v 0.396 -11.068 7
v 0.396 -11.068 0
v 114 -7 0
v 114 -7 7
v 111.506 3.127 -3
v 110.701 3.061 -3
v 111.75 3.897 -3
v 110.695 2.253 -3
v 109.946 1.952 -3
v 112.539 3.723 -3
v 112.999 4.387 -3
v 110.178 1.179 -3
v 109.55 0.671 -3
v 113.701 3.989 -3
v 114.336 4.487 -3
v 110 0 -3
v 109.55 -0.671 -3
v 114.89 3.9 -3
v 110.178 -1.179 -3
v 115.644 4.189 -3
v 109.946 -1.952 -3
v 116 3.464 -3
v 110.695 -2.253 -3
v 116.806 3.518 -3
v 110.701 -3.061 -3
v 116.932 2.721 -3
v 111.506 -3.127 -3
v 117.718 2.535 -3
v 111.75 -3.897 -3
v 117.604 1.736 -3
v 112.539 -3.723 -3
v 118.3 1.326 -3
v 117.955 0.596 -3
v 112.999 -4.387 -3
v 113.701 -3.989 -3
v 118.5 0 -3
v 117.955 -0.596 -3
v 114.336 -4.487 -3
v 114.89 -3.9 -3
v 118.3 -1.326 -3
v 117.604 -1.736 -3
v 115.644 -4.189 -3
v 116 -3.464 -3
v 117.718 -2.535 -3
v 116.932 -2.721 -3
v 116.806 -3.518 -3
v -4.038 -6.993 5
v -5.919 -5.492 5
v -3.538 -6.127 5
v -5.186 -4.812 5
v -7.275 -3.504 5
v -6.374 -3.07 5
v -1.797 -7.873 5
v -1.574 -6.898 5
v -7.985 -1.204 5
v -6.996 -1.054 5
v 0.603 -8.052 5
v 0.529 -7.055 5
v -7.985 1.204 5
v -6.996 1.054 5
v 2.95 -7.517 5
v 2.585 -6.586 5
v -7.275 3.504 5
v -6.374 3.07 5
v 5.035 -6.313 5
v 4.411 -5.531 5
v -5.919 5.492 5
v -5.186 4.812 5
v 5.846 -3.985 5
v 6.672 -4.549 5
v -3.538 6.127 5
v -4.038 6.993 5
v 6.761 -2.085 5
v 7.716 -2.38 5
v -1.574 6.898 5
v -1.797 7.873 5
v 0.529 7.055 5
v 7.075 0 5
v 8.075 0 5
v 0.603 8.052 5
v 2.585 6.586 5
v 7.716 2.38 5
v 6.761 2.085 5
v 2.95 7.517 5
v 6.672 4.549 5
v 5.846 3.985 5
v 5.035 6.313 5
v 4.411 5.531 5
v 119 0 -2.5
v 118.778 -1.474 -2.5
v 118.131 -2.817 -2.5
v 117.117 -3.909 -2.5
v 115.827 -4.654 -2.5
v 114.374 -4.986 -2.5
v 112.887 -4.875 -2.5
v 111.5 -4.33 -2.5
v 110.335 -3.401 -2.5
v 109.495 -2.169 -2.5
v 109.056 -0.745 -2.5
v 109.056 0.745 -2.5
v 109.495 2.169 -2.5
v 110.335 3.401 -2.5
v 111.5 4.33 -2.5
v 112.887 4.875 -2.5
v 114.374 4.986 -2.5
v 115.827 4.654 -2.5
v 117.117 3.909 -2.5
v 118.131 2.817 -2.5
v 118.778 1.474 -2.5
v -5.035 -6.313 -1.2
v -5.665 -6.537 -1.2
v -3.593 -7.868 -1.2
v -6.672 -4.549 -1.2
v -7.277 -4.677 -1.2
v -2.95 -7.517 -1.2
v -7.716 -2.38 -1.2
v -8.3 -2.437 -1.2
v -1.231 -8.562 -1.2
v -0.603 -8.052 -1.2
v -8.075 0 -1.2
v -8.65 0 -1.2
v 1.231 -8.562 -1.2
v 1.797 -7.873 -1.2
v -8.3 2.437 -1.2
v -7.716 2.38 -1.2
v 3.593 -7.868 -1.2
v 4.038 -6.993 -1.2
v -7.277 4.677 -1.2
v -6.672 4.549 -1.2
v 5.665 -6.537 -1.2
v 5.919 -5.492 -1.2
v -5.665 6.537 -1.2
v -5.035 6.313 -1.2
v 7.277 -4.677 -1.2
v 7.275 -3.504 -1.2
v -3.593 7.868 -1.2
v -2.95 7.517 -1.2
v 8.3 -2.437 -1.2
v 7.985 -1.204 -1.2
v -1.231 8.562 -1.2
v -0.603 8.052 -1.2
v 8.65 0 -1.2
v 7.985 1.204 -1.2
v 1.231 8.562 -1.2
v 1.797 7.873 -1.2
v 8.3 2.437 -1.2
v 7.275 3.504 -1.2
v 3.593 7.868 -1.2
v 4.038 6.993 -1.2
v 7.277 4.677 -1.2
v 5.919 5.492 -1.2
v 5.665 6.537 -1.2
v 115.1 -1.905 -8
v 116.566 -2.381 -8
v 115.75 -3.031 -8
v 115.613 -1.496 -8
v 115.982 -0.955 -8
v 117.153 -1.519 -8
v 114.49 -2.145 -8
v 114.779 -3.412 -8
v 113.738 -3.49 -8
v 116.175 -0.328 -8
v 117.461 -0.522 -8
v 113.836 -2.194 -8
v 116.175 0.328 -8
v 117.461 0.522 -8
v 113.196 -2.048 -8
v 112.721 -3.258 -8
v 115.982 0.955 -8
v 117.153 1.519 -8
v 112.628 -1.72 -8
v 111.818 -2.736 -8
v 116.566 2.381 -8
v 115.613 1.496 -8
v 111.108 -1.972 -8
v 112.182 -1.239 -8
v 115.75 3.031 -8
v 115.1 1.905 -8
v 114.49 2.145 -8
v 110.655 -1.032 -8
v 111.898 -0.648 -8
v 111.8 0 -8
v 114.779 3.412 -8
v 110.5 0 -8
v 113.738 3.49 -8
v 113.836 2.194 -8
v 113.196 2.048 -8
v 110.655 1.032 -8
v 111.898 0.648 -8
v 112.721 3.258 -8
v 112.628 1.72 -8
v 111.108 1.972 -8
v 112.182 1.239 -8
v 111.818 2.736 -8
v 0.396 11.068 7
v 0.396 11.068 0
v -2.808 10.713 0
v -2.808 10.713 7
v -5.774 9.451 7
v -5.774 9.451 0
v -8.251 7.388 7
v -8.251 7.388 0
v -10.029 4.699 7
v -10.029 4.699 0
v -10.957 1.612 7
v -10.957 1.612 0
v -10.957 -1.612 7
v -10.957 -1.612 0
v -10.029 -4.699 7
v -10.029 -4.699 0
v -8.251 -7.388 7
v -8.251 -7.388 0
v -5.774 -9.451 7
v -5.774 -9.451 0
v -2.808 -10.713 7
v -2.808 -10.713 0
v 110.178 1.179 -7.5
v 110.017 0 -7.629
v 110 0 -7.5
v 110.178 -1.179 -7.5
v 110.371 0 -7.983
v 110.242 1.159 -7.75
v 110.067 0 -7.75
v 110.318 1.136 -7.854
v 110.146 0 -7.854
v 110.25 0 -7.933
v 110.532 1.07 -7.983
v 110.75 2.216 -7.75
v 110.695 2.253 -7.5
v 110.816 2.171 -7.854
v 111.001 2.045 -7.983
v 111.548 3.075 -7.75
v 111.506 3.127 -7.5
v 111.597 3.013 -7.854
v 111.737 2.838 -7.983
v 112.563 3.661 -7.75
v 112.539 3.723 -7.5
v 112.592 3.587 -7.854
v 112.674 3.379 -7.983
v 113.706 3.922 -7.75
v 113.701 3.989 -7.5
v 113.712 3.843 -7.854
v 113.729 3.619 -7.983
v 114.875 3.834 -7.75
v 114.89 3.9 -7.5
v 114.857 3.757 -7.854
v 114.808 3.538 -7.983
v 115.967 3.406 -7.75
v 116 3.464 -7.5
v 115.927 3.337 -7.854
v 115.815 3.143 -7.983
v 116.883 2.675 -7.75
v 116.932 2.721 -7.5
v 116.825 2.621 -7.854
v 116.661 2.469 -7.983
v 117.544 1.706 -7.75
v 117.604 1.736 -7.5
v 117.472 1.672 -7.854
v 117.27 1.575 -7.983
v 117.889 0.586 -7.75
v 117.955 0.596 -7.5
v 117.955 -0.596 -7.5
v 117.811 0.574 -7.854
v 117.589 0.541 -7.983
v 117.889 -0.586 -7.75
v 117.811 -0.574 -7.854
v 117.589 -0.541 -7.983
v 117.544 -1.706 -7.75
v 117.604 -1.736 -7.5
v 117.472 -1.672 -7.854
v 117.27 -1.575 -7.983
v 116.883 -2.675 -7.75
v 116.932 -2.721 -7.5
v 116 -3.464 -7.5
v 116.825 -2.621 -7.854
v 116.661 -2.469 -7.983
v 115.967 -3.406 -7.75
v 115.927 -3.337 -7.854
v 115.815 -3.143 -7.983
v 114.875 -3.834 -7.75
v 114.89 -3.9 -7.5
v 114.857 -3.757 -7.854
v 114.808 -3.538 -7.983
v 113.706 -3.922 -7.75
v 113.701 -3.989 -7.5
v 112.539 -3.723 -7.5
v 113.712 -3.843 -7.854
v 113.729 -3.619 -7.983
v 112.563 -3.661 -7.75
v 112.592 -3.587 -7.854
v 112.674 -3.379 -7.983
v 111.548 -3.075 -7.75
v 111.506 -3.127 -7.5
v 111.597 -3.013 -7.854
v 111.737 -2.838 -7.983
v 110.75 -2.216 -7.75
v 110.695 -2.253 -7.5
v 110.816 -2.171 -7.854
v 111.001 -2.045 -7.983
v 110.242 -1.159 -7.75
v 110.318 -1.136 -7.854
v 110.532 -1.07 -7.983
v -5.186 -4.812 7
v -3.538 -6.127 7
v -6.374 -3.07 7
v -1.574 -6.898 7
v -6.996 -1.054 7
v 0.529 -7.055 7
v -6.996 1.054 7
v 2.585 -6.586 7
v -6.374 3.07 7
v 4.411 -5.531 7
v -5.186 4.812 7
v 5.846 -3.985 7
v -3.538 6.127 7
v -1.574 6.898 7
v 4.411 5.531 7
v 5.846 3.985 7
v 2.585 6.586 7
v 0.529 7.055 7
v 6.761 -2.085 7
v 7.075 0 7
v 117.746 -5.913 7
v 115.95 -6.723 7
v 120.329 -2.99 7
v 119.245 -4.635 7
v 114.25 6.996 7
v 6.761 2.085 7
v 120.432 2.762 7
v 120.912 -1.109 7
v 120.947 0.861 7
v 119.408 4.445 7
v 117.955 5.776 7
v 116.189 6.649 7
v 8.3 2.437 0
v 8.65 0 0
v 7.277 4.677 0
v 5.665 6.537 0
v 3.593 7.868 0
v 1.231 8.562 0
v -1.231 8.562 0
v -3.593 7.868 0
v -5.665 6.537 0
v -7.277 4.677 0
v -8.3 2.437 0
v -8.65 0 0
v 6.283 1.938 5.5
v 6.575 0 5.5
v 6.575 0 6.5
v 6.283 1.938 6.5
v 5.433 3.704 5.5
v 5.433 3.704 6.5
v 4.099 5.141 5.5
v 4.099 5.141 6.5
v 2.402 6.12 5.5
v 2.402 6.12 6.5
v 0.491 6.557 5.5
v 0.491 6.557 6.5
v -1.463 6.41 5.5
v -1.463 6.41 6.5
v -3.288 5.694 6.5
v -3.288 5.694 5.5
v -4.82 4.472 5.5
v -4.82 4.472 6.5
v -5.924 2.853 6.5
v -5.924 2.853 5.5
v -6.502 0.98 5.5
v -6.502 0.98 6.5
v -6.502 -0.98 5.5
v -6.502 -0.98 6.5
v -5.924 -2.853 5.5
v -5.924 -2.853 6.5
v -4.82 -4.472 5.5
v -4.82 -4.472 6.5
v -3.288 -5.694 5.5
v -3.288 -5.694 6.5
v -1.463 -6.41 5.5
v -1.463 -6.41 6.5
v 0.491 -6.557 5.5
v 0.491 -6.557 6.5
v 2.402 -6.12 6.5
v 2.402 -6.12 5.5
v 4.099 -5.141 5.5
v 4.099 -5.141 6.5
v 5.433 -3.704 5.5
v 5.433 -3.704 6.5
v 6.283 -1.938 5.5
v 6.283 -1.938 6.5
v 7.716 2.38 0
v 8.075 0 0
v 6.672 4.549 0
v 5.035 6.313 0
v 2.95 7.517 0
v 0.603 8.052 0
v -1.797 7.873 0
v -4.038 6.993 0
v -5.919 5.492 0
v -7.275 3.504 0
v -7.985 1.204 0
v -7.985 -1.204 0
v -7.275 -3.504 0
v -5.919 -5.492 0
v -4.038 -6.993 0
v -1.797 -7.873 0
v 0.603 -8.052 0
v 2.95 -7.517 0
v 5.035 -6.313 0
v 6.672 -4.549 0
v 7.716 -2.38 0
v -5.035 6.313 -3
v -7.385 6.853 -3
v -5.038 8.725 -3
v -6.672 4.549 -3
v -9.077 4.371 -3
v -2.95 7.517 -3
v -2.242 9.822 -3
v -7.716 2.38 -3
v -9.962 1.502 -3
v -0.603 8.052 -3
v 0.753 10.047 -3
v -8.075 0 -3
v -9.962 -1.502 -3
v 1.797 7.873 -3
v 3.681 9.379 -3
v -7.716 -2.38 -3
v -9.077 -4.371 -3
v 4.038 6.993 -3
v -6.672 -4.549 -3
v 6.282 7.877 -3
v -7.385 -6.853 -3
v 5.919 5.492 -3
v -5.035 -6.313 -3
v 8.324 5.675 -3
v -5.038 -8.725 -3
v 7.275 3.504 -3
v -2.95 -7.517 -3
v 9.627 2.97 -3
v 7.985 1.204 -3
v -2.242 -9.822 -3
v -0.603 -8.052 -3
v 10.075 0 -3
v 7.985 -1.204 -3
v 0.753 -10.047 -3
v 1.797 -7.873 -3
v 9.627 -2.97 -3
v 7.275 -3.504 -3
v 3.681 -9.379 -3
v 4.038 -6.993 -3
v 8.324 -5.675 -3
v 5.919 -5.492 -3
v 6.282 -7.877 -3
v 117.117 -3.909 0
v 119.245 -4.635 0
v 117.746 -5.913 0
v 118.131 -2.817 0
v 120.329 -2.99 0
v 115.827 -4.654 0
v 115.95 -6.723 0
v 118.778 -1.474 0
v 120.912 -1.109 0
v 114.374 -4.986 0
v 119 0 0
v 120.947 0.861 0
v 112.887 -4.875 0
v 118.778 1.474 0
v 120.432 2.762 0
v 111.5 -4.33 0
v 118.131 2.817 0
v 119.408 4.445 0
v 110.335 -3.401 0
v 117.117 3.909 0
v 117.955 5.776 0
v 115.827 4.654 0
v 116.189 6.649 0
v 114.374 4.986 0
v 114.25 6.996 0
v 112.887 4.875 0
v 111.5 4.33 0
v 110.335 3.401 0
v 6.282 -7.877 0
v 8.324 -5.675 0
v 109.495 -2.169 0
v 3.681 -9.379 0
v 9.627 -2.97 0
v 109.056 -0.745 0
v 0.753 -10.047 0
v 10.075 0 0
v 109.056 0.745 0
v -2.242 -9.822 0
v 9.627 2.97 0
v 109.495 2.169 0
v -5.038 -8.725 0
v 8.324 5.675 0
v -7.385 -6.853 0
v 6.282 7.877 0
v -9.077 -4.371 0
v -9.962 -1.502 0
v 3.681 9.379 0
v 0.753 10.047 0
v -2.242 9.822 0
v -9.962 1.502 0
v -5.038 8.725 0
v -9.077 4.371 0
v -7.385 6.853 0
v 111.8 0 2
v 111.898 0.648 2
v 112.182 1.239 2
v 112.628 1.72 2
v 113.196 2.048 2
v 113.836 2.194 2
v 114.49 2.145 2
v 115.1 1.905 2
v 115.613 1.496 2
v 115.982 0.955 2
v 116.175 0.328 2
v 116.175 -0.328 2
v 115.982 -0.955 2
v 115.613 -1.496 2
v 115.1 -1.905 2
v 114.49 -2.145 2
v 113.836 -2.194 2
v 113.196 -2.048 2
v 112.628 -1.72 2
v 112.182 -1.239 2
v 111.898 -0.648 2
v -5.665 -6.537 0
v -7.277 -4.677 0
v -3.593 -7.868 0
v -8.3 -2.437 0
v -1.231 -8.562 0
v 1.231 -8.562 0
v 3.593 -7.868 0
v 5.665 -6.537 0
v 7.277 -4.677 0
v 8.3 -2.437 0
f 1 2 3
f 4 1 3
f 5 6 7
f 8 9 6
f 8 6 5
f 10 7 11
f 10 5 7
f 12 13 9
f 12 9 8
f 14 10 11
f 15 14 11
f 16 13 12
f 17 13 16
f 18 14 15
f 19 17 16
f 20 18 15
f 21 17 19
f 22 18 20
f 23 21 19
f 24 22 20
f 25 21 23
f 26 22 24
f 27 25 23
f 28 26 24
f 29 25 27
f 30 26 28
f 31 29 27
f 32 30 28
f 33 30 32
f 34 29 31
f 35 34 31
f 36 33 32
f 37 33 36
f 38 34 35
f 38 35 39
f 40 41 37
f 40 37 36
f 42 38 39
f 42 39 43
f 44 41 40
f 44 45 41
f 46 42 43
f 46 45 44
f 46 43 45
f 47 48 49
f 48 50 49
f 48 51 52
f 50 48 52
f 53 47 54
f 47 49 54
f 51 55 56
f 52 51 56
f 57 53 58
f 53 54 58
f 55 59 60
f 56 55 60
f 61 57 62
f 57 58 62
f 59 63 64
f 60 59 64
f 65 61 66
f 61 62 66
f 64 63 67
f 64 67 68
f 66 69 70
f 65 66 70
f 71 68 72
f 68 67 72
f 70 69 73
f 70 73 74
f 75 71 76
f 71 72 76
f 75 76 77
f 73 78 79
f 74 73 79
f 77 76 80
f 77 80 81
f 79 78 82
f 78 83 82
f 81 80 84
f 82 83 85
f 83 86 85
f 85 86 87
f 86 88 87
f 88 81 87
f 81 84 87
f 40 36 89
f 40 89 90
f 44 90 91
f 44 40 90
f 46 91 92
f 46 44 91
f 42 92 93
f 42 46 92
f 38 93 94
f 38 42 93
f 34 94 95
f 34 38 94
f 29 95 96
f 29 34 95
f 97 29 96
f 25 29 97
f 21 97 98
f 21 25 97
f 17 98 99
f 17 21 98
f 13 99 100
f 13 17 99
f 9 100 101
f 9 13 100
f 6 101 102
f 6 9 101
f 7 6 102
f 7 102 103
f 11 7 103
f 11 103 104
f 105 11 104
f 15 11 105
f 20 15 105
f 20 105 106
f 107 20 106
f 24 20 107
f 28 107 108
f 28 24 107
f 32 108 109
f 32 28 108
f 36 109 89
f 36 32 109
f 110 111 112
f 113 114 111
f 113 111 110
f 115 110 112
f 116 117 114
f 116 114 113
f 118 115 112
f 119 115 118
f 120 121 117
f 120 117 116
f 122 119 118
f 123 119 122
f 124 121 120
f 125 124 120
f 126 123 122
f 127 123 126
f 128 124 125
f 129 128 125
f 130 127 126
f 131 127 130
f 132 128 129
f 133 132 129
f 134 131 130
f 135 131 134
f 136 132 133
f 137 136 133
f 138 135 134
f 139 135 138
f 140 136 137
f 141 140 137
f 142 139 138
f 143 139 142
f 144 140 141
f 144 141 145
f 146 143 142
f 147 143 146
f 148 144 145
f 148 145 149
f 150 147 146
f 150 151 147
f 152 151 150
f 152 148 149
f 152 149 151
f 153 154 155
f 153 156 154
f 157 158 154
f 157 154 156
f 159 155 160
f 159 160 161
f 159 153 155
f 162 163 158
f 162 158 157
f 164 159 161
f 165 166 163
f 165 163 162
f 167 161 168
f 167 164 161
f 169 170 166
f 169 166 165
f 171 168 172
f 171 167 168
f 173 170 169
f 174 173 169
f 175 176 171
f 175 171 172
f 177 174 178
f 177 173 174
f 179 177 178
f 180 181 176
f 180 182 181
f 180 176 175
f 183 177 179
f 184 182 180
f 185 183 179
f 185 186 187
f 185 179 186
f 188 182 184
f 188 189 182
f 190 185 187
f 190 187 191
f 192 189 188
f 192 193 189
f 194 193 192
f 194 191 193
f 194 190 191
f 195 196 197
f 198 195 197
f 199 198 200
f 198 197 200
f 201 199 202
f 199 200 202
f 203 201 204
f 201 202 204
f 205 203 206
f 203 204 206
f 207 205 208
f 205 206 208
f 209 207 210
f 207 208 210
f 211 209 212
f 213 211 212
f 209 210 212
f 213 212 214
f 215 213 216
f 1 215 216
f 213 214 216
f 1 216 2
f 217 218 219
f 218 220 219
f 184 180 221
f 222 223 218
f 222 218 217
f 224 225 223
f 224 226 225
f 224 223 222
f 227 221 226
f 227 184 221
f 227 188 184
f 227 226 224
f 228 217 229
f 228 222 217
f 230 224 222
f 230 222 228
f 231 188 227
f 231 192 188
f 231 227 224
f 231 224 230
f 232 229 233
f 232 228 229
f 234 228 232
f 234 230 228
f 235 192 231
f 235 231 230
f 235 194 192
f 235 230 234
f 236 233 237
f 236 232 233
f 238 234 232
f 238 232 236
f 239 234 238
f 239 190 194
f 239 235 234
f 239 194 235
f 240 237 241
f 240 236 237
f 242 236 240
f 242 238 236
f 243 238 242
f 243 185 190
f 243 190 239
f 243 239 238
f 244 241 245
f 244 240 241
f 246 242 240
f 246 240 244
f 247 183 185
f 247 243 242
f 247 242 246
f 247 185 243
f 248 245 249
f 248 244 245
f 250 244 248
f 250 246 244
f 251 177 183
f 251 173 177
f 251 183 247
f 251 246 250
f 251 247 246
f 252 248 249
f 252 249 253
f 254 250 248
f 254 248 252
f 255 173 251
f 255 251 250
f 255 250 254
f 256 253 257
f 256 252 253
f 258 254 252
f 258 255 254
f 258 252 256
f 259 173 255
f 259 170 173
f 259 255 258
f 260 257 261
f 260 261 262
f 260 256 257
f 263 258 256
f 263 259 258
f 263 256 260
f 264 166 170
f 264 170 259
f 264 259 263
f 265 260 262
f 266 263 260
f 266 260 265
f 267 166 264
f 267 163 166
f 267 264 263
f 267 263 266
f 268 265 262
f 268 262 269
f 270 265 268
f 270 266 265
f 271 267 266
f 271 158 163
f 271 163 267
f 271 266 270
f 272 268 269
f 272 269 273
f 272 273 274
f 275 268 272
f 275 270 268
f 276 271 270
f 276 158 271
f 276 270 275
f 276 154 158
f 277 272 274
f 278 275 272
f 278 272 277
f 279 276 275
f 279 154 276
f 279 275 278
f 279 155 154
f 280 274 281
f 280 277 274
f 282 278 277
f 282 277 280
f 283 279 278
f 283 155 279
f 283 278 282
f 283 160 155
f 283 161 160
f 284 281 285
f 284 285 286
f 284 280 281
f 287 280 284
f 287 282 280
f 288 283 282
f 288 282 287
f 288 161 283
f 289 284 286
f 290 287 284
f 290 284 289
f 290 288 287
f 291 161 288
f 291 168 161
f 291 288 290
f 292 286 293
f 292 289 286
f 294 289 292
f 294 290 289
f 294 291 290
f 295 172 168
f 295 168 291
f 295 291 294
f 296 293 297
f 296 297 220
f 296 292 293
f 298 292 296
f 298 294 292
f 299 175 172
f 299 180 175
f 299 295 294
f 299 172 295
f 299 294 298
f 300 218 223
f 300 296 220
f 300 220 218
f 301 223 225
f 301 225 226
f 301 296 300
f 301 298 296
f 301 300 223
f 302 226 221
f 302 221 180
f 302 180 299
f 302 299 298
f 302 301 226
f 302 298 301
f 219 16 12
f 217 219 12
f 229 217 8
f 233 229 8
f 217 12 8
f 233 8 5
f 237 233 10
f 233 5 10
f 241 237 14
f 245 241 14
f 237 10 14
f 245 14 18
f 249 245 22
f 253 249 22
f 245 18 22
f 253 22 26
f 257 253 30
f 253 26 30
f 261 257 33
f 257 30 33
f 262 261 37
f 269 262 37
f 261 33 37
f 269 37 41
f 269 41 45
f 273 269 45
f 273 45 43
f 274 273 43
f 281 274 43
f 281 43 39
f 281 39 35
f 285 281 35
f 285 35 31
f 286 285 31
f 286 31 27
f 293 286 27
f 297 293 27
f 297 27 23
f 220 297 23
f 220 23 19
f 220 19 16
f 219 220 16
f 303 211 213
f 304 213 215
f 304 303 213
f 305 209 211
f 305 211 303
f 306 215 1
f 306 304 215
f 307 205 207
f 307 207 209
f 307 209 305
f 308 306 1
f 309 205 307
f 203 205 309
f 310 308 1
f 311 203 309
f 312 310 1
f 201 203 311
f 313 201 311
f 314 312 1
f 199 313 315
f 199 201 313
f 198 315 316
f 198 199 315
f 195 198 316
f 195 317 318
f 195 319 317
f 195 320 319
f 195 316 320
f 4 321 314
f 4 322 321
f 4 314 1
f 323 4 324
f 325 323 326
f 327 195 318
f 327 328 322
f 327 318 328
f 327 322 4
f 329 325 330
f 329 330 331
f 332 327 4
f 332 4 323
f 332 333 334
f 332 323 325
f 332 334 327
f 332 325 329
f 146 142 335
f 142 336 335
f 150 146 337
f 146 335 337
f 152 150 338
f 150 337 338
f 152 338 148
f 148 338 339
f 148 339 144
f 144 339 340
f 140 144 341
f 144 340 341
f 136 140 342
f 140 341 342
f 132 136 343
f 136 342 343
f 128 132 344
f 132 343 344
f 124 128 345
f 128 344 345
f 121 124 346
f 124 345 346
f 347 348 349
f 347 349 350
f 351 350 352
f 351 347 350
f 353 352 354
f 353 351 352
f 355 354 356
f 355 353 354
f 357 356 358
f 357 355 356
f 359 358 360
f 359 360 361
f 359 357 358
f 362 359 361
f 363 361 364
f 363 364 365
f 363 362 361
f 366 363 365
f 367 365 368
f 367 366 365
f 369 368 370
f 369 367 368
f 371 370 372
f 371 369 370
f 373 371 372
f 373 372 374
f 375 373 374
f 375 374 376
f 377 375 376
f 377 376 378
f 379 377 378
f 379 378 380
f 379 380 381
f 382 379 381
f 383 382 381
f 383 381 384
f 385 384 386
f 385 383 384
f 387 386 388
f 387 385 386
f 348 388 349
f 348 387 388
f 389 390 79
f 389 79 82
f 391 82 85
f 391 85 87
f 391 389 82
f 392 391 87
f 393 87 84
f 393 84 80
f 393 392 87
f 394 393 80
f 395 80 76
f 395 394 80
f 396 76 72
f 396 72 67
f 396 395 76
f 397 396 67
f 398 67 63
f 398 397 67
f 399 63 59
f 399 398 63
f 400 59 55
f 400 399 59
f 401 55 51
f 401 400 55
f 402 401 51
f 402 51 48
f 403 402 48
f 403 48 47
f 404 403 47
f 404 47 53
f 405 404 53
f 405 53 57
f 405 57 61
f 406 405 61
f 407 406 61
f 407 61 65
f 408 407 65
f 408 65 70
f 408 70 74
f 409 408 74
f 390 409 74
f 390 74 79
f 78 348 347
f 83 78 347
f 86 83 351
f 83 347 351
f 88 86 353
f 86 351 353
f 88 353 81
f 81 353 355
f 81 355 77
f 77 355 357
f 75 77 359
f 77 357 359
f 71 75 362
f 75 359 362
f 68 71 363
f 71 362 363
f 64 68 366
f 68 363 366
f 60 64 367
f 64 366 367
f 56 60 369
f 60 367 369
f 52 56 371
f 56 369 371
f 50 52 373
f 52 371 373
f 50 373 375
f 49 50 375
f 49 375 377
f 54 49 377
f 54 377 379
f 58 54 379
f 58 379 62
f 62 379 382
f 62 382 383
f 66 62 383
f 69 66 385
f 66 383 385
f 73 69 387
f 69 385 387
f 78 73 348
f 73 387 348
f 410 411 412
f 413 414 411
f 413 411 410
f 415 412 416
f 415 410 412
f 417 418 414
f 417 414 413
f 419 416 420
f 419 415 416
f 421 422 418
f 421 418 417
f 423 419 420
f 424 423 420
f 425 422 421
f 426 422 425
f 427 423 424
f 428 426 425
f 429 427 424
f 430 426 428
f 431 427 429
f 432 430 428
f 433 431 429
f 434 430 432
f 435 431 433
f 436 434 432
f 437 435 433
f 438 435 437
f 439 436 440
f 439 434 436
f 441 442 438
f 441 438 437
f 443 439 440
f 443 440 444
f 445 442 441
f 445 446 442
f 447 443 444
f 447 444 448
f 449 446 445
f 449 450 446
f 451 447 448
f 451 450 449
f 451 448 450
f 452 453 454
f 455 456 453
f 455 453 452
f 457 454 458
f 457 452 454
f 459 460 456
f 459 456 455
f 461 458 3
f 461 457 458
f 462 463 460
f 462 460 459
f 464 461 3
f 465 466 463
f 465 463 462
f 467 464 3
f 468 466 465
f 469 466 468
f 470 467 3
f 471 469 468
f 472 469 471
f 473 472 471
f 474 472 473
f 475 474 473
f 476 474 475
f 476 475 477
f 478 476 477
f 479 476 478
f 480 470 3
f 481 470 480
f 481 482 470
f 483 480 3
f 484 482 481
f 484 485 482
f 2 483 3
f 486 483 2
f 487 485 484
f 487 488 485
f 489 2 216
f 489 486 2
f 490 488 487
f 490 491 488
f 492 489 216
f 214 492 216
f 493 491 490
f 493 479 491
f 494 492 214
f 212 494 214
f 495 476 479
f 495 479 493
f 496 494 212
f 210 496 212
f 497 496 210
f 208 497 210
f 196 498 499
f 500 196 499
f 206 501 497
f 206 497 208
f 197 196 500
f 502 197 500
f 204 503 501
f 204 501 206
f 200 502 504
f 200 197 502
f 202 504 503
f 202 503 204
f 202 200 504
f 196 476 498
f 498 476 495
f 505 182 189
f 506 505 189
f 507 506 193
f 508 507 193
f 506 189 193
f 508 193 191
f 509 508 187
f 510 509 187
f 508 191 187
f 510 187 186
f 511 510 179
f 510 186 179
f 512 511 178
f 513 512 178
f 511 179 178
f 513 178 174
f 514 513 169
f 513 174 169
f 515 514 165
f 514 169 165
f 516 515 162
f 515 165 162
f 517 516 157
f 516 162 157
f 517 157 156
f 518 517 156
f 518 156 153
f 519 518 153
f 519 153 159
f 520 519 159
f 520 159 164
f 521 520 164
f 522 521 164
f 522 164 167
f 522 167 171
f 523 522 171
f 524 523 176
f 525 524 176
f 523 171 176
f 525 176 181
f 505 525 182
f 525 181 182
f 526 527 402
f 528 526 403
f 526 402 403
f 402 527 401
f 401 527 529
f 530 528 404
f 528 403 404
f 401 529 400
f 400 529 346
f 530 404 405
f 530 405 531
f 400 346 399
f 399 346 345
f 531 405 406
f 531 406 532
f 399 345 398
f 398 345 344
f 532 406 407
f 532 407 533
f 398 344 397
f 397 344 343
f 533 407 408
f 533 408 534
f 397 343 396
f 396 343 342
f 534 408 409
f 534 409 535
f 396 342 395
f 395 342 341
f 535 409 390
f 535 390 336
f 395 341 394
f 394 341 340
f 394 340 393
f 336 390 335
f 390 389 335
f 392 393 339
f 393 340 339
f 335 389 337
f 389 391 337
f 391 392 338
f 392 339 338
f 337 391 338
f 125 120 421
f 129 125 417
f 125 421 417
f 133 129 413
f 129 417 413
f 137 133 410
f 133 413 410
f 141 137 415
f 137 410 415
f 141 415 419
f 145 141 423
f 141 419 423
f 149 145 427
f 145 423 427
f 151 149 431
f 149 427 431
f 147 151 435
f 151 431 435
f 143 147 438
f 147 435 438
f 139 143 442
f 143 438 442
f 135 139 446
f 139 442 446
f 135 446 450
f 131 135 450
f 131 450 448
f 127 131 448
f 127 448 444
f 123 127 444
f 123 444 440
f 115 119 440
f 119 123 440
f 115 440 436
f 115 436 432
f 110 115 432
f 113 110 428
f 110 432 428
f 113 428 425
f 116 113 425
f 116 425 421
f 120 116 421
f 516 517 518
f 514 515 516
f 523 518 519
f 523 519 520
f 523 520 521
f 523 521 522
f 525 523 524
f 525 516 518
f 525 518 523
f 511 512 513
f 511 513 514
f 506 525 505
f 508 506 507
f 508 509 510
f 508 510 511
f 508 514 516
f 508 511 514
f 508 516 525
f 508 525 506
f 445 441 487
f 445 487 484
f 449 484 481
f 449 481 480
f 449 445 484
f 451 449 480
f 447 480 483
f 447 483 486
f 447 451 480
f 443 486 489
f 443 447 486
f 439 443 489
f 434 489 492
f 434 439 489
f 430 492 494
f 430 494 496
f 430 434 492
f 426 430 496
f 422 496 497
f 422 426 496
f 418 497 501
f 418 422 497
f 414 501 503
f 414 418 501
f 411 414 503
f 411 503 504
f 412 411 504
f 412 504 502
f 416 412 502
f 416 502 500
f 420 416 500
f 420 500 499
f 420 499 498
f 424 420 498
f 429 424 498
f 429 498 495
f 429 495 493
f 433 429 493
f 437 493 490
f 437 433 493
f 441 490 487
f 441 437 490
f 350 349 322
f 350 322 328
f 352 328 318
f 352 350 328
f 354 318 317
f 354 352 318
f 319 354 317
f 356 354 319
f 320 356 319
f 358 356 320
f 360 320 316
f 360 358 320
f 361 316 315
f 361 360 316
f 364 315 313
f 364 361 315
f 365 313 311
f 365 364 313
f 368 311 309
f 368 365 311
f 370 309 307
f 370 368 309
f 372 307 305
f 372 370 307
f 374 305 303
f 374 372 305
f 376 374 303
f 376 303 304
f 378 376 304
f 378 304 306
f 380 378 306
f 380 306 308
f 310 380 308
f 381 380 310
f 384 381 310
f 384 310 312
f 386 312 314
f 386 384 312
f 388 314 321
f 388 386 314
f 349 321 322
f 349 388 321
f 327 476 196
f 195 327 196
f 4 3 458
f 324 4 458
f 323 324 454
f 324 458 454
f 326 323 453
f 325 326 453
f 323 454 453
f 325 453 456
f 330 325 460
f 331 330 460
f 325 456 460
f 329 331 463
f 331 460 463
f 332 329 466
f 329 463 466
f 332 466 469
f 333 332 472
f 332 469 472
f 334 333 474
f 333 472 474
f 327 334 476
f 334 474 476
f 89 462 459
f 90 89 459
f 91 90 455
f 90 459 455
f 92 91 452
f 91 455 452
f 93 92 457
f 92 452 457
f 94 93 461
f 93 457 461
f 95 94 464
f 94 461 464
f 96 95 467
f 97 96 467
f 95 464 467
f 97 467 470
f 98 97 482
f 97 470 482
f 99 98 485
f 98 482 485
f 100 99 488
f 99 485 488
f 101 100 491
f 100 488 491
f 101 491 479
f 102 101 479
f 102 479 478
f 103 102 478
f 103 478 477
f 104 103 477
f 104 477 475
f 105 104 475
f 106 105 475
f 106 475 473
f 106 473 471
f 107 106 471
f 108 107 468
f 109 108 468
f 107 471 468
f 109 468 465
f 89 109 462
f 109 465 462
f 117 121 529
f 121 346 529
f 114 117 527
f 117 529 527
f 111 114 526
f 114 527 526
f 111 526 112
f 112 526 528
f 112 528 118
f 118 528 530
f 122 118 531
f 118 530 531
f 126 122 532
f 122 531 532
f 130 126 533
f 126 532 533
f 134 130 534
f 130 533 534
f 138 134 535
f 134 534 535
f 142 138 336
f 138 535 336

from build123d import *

# Parameters (mm, degrees)
SKETCH_1_R          = 8.075
EXTRUDE_1_DEPTH     = 7
EXTRUDE_START       = -2
SKETCH_2_R          = 8.075
SKETCH_2_R_2        = 6.575
EXTRUDE_2_DEPTH     = 2
SKETCH_3_R          = 4
EXTRUDE_3_DEPTH     = 10
SKETCH_4_R          = 5
SKETCH_4_R_2        = 4
EXTRUDE_4_DEPTH     = 3
CHAMFER_1_SIZE      = 0.5
CUT_EXTRUDE_1_DEPTH = 7
CUT_EXTRUDE_2_DEPTH = 5
CUT_EXTRUDE_START   = -2
SKETCH_8_R          = 4
CUT_EXTRUDE_3_DEPTH = 2
FILLET_1_R          = 0.5
SKETCH_9_R          = 2.2
CUT_EXTRUDE_4_DEPTH = 10
EXTRUDE_START_2     = 3
SKETCH_10_R         = 10.075
SKETCH_10_R_2       = 8.075
EXTRUDE_5_DEPTH     = 3
EXTRUDE_6_DEPTH     = 2
EXTRUDE_START_3     = 5
EXTRUDE_7_DEPTH     = 5


with BuildPart() as part:
    # 草图1 → 凸台-拉伸1 (new body)
    with BuildSketch(Plane.XY):
        with BuildLine():
            ThreePointArc((0.395882675, 11.067922204), (-11.074999998, -0.000217919), (0.396318234, -11.067906616))
            Line((0.396318234, -11.067906616), (114, -7))
            ThreePointArc((114, -7), (120.998881523, -0.125129643), (114.250219298, 6.995526449))
            Line((114.250219298, 6.995526449), (0.395882675, 11.067922204))
        make_face()
        Circle(SKETCH_1_R, mode=Mode.SUBTRACT)
    extrude(amount=EXTRUDE_1_DEPTH)

    # 草图2 → 凸台-拉伸2 (add)
    with BuildSketch(Plane.XY.offset(7).offset(EXTRUDE_START)):
        Circle(SKETCH_2_R)
        Circle(SKETCH_2_R_2, mode=Mode.SUBTRACT)
    extrude(amount=EXTRUDE_2_DEPTH)

    # 草图3 → 凸台-拉伸3 (add)
    with BuildSketch(Plane(origin=(0, 0, 0), x_dir=(-1, 0, 0), z_dir=(0, 0, -1))):
        with Locations((-114, 0)):
            Circle(SKETCH_3_R)
    extrude(amount=EXTRUDE_3_DEPTH)

    # 草图4 → 凸台-拉伸4 (add)
    with BuildSketch(Plane(origin=(0, 0, 0), x_dir=(-1, 0, 0), z_dir=(0, 0, -1))):
        with Locations(Location((-114, 0, 0), (0, 0, 180))):
            Circle(SKETCH_4_R)
        with Locations((-114, 0)):
            Circle(SKETCH_4_R_2, mode=Mode.SUBTRACT)
    extrude(amount=EXTRUDE_4_DEPTH)

    # 倒角1
    chamfer_1_edges = [part.edges().sort_by_distance(p)[0] for p in [
        (-6.575, 0, 5),
        (-6.575, 0, 7),
        (118, 0, -10),
        (109, 0, -3),
    ]]
    chamfer(chamfer_1_edges, length=CHAMFER_1_SIZE)

    # 草图5 → 切除-拉伸1 (cut)
    with BuildSketch(Plane(origin=(0, 0, 0), x_dir=(-1, 0, 0), z_dir=(0, 0, -1))):
        with BuildLine():
            ThreePointArc((-12.757234161, -4.640431182), (-13.574999998, 0.000234775), (-12.757073645, 4.640872443))
            Line((-12.757073645, 4.640872443), (-104.114755838, 1.510611753))
            ThreePointArc((-104.114755838, 1.510611753), (-104.028730231, 0.75748214), (-104, 0))
            ThreePointArc((-104, 0), (-104.028593207, -0.755676237), (-104.114209315, -1.507031033))
            Line((-104.114209315, -1.507031033), (-12.757234161, -4.640431182))
        make_face()
    extrude(amount=-CUT_EXTRUDE_1_DEPTH, mode=Mode.SUBTRACT)

    # 草图6 → 切除-拉伸2 (cut)
    with BuildSketch(Plane(origin=(0, 0, 0), x_dir=(-1, 0, 0), z_dir=(0, 0, -1))):
        Polygon((-104.114209315, -1.507031033), (-12.757234161, -4.640431182), (-12.860068961, -7.638668165), (-104.217044114, -4.505268015), align=None)
        Polygon((-12.757073645, 4.640872443), (-104.114755838, 1.510611753), (-104.217486931, 4.508852291), (-12.859804737, 7.63911298), align=None)
    extrude(amount=-CUT_EXTRUDE_2_DEPTH, mode=Mode.SUBTRACT)

    # 草图8 → 切除-拉伸3 (cut)
    with BuildSketch(Plane(origin=(0, 0, -10), x_dir=(-1, 0, 0), z_dir=(0, 0, -1)).offset(CUT_EXTRUDE_START)):
        with Locations((-114, 0)):
            Circle(SKETCH_8_R)
    extrude(amount=CUT_EXTRUDE_3_DEPTH, mode=Mode.SUBTRACT)

    # 圆角1
    fillet_1_edges = [part.edges().sort_by_distance(p)[0] for p in [
        (118, 0, -8),
    ]]
    fillet(fillet_1_edges, radius=FILLET_1_R)

    # 草图9 → 切除-拉伸4 (cut)
    with BuildSketch(Plane(origin=(0, 0, -8), x_dir=(-1, 0, 0), z_dir=(0, 0, -1))):
        with Locations((-114, 0)):
            Circle(SKETCH_9_R)
    extrude(amount=-CUT_EXTRUDE_4_DEPTH, mode=Mode.SUBTRACT)

    # 草图10 → 凸台-拉伸5 (add)
    with BuildSketch(Plane(origin=(0, 0, 0), x_dir=(-1, 0, 0), z_dir=(0, 0, -1)).offset(EXTRUDE_START_2)):
        with Locations(Location((0, 0, 0), (0, 0, 180))):
            Circle(SKETCH_10_R)
        Circle(SKETCH_10_R_2, mode=Mode.SUBTRACT)
    extrude(amount=-EXTRUDE_5_DEPTH)

    # 切除-旋转2: read off the stored shape, not the designer's step
    # 切除-旋转2: loft between two sections, ruled curve by curve
    cut_revolve_2_from = [
        Edge.make_three_point_arc((8.65, 0, -1.2), (0, 8.65, -1.2), (-8.65, 0, -1.2)),
        Edge.make_three_point_arc((-8.65, 0, -1.2), (0, -8.65, -1.2), (8.65, 0, -1.2)),
    ]
    cut_revolve_2_to = [
        Edge.make_three_point_arc((8.65, 0, 0), (0, 8.65, 0), (-8.65, 0, 0)),
        Edge.make_three_point_arc((-8.65, 0, 0), (0, -8.65, 0), (8.65, 0, 0)),
    ]
    cut_revolve_2 = Solid(Shell([*[Face.make_surface_from_curves(cut_revolve_2_from[k], cut_revolve_2_to[k]) for k in range(2)], Face(Wire(cut_revolve_2_from)), Face(Wire(cut_revolve_2_to))]))
    add(cut_revolve_2, mode=Mode.SUBTRACT)

    # 草图12 → 凸台-拉伸6 (add)
    with BuildSketch(Plane.XY.offset(7).offset(EXTRUDE_START)):
        with BuildLine():
            Line((104.114209315, -1.507031033), (12.757234161, -4.640431182))
            ThreePointArc((12.757234161, -4.640431182), (13.574999998, 0.000234775), (12.757073645, 4.640872443))
            Line((12.757073645, 4.640872443), (104.114755838, 1.510611753))
            ThreePointArc((104.114755838, 1.510611753), (104.000000164, 0.001811094), (104.114209315, -1.507031033))
        make_face()
    extrude(amount=EXTRUDE_6_DEPTH)

    # 草图13 → 凸台-拉伸7 (add)
    with BuildSketch(Plane(origin=(0, 0, 5), x_dir=(-1, 0, 0), z_dir=(0, 0, -1)).offset(EXTRUDE_START_3)):
        with BuildLine():
            Line((-104.114209315, -1.507031033), (-104.217044114, -4.505268015))
            Line((-104.217044114, -4.505268015), (-12.860068961, -7.638668165))
            Line((-12.860068961, -7.638668165), (-12.757234161, -4.640431182))
            ThreePointArc((-12.757234161, -4.640431182), (-13.574999998, 0.000234775), (-12.757073645, 4.640872443))
            Line((-12.757073645, 4.640872443), (-12.859804737, 7.63911298))
            Line((-12.859804737, 7.63911298), (-104.217486931, 4.508852291))
            Line((-104.217486931, 4.508852291), (-104.114755838, 1.510611753))
            ThreePointArc((-104.114755838, 1.510611753), (-104.000000164, 0.001811094), (-104.114209315, -1.507031033))
        make_face()
    extrude(amount=-EXTRUDE_7_DEPTH)


solid = part.part
